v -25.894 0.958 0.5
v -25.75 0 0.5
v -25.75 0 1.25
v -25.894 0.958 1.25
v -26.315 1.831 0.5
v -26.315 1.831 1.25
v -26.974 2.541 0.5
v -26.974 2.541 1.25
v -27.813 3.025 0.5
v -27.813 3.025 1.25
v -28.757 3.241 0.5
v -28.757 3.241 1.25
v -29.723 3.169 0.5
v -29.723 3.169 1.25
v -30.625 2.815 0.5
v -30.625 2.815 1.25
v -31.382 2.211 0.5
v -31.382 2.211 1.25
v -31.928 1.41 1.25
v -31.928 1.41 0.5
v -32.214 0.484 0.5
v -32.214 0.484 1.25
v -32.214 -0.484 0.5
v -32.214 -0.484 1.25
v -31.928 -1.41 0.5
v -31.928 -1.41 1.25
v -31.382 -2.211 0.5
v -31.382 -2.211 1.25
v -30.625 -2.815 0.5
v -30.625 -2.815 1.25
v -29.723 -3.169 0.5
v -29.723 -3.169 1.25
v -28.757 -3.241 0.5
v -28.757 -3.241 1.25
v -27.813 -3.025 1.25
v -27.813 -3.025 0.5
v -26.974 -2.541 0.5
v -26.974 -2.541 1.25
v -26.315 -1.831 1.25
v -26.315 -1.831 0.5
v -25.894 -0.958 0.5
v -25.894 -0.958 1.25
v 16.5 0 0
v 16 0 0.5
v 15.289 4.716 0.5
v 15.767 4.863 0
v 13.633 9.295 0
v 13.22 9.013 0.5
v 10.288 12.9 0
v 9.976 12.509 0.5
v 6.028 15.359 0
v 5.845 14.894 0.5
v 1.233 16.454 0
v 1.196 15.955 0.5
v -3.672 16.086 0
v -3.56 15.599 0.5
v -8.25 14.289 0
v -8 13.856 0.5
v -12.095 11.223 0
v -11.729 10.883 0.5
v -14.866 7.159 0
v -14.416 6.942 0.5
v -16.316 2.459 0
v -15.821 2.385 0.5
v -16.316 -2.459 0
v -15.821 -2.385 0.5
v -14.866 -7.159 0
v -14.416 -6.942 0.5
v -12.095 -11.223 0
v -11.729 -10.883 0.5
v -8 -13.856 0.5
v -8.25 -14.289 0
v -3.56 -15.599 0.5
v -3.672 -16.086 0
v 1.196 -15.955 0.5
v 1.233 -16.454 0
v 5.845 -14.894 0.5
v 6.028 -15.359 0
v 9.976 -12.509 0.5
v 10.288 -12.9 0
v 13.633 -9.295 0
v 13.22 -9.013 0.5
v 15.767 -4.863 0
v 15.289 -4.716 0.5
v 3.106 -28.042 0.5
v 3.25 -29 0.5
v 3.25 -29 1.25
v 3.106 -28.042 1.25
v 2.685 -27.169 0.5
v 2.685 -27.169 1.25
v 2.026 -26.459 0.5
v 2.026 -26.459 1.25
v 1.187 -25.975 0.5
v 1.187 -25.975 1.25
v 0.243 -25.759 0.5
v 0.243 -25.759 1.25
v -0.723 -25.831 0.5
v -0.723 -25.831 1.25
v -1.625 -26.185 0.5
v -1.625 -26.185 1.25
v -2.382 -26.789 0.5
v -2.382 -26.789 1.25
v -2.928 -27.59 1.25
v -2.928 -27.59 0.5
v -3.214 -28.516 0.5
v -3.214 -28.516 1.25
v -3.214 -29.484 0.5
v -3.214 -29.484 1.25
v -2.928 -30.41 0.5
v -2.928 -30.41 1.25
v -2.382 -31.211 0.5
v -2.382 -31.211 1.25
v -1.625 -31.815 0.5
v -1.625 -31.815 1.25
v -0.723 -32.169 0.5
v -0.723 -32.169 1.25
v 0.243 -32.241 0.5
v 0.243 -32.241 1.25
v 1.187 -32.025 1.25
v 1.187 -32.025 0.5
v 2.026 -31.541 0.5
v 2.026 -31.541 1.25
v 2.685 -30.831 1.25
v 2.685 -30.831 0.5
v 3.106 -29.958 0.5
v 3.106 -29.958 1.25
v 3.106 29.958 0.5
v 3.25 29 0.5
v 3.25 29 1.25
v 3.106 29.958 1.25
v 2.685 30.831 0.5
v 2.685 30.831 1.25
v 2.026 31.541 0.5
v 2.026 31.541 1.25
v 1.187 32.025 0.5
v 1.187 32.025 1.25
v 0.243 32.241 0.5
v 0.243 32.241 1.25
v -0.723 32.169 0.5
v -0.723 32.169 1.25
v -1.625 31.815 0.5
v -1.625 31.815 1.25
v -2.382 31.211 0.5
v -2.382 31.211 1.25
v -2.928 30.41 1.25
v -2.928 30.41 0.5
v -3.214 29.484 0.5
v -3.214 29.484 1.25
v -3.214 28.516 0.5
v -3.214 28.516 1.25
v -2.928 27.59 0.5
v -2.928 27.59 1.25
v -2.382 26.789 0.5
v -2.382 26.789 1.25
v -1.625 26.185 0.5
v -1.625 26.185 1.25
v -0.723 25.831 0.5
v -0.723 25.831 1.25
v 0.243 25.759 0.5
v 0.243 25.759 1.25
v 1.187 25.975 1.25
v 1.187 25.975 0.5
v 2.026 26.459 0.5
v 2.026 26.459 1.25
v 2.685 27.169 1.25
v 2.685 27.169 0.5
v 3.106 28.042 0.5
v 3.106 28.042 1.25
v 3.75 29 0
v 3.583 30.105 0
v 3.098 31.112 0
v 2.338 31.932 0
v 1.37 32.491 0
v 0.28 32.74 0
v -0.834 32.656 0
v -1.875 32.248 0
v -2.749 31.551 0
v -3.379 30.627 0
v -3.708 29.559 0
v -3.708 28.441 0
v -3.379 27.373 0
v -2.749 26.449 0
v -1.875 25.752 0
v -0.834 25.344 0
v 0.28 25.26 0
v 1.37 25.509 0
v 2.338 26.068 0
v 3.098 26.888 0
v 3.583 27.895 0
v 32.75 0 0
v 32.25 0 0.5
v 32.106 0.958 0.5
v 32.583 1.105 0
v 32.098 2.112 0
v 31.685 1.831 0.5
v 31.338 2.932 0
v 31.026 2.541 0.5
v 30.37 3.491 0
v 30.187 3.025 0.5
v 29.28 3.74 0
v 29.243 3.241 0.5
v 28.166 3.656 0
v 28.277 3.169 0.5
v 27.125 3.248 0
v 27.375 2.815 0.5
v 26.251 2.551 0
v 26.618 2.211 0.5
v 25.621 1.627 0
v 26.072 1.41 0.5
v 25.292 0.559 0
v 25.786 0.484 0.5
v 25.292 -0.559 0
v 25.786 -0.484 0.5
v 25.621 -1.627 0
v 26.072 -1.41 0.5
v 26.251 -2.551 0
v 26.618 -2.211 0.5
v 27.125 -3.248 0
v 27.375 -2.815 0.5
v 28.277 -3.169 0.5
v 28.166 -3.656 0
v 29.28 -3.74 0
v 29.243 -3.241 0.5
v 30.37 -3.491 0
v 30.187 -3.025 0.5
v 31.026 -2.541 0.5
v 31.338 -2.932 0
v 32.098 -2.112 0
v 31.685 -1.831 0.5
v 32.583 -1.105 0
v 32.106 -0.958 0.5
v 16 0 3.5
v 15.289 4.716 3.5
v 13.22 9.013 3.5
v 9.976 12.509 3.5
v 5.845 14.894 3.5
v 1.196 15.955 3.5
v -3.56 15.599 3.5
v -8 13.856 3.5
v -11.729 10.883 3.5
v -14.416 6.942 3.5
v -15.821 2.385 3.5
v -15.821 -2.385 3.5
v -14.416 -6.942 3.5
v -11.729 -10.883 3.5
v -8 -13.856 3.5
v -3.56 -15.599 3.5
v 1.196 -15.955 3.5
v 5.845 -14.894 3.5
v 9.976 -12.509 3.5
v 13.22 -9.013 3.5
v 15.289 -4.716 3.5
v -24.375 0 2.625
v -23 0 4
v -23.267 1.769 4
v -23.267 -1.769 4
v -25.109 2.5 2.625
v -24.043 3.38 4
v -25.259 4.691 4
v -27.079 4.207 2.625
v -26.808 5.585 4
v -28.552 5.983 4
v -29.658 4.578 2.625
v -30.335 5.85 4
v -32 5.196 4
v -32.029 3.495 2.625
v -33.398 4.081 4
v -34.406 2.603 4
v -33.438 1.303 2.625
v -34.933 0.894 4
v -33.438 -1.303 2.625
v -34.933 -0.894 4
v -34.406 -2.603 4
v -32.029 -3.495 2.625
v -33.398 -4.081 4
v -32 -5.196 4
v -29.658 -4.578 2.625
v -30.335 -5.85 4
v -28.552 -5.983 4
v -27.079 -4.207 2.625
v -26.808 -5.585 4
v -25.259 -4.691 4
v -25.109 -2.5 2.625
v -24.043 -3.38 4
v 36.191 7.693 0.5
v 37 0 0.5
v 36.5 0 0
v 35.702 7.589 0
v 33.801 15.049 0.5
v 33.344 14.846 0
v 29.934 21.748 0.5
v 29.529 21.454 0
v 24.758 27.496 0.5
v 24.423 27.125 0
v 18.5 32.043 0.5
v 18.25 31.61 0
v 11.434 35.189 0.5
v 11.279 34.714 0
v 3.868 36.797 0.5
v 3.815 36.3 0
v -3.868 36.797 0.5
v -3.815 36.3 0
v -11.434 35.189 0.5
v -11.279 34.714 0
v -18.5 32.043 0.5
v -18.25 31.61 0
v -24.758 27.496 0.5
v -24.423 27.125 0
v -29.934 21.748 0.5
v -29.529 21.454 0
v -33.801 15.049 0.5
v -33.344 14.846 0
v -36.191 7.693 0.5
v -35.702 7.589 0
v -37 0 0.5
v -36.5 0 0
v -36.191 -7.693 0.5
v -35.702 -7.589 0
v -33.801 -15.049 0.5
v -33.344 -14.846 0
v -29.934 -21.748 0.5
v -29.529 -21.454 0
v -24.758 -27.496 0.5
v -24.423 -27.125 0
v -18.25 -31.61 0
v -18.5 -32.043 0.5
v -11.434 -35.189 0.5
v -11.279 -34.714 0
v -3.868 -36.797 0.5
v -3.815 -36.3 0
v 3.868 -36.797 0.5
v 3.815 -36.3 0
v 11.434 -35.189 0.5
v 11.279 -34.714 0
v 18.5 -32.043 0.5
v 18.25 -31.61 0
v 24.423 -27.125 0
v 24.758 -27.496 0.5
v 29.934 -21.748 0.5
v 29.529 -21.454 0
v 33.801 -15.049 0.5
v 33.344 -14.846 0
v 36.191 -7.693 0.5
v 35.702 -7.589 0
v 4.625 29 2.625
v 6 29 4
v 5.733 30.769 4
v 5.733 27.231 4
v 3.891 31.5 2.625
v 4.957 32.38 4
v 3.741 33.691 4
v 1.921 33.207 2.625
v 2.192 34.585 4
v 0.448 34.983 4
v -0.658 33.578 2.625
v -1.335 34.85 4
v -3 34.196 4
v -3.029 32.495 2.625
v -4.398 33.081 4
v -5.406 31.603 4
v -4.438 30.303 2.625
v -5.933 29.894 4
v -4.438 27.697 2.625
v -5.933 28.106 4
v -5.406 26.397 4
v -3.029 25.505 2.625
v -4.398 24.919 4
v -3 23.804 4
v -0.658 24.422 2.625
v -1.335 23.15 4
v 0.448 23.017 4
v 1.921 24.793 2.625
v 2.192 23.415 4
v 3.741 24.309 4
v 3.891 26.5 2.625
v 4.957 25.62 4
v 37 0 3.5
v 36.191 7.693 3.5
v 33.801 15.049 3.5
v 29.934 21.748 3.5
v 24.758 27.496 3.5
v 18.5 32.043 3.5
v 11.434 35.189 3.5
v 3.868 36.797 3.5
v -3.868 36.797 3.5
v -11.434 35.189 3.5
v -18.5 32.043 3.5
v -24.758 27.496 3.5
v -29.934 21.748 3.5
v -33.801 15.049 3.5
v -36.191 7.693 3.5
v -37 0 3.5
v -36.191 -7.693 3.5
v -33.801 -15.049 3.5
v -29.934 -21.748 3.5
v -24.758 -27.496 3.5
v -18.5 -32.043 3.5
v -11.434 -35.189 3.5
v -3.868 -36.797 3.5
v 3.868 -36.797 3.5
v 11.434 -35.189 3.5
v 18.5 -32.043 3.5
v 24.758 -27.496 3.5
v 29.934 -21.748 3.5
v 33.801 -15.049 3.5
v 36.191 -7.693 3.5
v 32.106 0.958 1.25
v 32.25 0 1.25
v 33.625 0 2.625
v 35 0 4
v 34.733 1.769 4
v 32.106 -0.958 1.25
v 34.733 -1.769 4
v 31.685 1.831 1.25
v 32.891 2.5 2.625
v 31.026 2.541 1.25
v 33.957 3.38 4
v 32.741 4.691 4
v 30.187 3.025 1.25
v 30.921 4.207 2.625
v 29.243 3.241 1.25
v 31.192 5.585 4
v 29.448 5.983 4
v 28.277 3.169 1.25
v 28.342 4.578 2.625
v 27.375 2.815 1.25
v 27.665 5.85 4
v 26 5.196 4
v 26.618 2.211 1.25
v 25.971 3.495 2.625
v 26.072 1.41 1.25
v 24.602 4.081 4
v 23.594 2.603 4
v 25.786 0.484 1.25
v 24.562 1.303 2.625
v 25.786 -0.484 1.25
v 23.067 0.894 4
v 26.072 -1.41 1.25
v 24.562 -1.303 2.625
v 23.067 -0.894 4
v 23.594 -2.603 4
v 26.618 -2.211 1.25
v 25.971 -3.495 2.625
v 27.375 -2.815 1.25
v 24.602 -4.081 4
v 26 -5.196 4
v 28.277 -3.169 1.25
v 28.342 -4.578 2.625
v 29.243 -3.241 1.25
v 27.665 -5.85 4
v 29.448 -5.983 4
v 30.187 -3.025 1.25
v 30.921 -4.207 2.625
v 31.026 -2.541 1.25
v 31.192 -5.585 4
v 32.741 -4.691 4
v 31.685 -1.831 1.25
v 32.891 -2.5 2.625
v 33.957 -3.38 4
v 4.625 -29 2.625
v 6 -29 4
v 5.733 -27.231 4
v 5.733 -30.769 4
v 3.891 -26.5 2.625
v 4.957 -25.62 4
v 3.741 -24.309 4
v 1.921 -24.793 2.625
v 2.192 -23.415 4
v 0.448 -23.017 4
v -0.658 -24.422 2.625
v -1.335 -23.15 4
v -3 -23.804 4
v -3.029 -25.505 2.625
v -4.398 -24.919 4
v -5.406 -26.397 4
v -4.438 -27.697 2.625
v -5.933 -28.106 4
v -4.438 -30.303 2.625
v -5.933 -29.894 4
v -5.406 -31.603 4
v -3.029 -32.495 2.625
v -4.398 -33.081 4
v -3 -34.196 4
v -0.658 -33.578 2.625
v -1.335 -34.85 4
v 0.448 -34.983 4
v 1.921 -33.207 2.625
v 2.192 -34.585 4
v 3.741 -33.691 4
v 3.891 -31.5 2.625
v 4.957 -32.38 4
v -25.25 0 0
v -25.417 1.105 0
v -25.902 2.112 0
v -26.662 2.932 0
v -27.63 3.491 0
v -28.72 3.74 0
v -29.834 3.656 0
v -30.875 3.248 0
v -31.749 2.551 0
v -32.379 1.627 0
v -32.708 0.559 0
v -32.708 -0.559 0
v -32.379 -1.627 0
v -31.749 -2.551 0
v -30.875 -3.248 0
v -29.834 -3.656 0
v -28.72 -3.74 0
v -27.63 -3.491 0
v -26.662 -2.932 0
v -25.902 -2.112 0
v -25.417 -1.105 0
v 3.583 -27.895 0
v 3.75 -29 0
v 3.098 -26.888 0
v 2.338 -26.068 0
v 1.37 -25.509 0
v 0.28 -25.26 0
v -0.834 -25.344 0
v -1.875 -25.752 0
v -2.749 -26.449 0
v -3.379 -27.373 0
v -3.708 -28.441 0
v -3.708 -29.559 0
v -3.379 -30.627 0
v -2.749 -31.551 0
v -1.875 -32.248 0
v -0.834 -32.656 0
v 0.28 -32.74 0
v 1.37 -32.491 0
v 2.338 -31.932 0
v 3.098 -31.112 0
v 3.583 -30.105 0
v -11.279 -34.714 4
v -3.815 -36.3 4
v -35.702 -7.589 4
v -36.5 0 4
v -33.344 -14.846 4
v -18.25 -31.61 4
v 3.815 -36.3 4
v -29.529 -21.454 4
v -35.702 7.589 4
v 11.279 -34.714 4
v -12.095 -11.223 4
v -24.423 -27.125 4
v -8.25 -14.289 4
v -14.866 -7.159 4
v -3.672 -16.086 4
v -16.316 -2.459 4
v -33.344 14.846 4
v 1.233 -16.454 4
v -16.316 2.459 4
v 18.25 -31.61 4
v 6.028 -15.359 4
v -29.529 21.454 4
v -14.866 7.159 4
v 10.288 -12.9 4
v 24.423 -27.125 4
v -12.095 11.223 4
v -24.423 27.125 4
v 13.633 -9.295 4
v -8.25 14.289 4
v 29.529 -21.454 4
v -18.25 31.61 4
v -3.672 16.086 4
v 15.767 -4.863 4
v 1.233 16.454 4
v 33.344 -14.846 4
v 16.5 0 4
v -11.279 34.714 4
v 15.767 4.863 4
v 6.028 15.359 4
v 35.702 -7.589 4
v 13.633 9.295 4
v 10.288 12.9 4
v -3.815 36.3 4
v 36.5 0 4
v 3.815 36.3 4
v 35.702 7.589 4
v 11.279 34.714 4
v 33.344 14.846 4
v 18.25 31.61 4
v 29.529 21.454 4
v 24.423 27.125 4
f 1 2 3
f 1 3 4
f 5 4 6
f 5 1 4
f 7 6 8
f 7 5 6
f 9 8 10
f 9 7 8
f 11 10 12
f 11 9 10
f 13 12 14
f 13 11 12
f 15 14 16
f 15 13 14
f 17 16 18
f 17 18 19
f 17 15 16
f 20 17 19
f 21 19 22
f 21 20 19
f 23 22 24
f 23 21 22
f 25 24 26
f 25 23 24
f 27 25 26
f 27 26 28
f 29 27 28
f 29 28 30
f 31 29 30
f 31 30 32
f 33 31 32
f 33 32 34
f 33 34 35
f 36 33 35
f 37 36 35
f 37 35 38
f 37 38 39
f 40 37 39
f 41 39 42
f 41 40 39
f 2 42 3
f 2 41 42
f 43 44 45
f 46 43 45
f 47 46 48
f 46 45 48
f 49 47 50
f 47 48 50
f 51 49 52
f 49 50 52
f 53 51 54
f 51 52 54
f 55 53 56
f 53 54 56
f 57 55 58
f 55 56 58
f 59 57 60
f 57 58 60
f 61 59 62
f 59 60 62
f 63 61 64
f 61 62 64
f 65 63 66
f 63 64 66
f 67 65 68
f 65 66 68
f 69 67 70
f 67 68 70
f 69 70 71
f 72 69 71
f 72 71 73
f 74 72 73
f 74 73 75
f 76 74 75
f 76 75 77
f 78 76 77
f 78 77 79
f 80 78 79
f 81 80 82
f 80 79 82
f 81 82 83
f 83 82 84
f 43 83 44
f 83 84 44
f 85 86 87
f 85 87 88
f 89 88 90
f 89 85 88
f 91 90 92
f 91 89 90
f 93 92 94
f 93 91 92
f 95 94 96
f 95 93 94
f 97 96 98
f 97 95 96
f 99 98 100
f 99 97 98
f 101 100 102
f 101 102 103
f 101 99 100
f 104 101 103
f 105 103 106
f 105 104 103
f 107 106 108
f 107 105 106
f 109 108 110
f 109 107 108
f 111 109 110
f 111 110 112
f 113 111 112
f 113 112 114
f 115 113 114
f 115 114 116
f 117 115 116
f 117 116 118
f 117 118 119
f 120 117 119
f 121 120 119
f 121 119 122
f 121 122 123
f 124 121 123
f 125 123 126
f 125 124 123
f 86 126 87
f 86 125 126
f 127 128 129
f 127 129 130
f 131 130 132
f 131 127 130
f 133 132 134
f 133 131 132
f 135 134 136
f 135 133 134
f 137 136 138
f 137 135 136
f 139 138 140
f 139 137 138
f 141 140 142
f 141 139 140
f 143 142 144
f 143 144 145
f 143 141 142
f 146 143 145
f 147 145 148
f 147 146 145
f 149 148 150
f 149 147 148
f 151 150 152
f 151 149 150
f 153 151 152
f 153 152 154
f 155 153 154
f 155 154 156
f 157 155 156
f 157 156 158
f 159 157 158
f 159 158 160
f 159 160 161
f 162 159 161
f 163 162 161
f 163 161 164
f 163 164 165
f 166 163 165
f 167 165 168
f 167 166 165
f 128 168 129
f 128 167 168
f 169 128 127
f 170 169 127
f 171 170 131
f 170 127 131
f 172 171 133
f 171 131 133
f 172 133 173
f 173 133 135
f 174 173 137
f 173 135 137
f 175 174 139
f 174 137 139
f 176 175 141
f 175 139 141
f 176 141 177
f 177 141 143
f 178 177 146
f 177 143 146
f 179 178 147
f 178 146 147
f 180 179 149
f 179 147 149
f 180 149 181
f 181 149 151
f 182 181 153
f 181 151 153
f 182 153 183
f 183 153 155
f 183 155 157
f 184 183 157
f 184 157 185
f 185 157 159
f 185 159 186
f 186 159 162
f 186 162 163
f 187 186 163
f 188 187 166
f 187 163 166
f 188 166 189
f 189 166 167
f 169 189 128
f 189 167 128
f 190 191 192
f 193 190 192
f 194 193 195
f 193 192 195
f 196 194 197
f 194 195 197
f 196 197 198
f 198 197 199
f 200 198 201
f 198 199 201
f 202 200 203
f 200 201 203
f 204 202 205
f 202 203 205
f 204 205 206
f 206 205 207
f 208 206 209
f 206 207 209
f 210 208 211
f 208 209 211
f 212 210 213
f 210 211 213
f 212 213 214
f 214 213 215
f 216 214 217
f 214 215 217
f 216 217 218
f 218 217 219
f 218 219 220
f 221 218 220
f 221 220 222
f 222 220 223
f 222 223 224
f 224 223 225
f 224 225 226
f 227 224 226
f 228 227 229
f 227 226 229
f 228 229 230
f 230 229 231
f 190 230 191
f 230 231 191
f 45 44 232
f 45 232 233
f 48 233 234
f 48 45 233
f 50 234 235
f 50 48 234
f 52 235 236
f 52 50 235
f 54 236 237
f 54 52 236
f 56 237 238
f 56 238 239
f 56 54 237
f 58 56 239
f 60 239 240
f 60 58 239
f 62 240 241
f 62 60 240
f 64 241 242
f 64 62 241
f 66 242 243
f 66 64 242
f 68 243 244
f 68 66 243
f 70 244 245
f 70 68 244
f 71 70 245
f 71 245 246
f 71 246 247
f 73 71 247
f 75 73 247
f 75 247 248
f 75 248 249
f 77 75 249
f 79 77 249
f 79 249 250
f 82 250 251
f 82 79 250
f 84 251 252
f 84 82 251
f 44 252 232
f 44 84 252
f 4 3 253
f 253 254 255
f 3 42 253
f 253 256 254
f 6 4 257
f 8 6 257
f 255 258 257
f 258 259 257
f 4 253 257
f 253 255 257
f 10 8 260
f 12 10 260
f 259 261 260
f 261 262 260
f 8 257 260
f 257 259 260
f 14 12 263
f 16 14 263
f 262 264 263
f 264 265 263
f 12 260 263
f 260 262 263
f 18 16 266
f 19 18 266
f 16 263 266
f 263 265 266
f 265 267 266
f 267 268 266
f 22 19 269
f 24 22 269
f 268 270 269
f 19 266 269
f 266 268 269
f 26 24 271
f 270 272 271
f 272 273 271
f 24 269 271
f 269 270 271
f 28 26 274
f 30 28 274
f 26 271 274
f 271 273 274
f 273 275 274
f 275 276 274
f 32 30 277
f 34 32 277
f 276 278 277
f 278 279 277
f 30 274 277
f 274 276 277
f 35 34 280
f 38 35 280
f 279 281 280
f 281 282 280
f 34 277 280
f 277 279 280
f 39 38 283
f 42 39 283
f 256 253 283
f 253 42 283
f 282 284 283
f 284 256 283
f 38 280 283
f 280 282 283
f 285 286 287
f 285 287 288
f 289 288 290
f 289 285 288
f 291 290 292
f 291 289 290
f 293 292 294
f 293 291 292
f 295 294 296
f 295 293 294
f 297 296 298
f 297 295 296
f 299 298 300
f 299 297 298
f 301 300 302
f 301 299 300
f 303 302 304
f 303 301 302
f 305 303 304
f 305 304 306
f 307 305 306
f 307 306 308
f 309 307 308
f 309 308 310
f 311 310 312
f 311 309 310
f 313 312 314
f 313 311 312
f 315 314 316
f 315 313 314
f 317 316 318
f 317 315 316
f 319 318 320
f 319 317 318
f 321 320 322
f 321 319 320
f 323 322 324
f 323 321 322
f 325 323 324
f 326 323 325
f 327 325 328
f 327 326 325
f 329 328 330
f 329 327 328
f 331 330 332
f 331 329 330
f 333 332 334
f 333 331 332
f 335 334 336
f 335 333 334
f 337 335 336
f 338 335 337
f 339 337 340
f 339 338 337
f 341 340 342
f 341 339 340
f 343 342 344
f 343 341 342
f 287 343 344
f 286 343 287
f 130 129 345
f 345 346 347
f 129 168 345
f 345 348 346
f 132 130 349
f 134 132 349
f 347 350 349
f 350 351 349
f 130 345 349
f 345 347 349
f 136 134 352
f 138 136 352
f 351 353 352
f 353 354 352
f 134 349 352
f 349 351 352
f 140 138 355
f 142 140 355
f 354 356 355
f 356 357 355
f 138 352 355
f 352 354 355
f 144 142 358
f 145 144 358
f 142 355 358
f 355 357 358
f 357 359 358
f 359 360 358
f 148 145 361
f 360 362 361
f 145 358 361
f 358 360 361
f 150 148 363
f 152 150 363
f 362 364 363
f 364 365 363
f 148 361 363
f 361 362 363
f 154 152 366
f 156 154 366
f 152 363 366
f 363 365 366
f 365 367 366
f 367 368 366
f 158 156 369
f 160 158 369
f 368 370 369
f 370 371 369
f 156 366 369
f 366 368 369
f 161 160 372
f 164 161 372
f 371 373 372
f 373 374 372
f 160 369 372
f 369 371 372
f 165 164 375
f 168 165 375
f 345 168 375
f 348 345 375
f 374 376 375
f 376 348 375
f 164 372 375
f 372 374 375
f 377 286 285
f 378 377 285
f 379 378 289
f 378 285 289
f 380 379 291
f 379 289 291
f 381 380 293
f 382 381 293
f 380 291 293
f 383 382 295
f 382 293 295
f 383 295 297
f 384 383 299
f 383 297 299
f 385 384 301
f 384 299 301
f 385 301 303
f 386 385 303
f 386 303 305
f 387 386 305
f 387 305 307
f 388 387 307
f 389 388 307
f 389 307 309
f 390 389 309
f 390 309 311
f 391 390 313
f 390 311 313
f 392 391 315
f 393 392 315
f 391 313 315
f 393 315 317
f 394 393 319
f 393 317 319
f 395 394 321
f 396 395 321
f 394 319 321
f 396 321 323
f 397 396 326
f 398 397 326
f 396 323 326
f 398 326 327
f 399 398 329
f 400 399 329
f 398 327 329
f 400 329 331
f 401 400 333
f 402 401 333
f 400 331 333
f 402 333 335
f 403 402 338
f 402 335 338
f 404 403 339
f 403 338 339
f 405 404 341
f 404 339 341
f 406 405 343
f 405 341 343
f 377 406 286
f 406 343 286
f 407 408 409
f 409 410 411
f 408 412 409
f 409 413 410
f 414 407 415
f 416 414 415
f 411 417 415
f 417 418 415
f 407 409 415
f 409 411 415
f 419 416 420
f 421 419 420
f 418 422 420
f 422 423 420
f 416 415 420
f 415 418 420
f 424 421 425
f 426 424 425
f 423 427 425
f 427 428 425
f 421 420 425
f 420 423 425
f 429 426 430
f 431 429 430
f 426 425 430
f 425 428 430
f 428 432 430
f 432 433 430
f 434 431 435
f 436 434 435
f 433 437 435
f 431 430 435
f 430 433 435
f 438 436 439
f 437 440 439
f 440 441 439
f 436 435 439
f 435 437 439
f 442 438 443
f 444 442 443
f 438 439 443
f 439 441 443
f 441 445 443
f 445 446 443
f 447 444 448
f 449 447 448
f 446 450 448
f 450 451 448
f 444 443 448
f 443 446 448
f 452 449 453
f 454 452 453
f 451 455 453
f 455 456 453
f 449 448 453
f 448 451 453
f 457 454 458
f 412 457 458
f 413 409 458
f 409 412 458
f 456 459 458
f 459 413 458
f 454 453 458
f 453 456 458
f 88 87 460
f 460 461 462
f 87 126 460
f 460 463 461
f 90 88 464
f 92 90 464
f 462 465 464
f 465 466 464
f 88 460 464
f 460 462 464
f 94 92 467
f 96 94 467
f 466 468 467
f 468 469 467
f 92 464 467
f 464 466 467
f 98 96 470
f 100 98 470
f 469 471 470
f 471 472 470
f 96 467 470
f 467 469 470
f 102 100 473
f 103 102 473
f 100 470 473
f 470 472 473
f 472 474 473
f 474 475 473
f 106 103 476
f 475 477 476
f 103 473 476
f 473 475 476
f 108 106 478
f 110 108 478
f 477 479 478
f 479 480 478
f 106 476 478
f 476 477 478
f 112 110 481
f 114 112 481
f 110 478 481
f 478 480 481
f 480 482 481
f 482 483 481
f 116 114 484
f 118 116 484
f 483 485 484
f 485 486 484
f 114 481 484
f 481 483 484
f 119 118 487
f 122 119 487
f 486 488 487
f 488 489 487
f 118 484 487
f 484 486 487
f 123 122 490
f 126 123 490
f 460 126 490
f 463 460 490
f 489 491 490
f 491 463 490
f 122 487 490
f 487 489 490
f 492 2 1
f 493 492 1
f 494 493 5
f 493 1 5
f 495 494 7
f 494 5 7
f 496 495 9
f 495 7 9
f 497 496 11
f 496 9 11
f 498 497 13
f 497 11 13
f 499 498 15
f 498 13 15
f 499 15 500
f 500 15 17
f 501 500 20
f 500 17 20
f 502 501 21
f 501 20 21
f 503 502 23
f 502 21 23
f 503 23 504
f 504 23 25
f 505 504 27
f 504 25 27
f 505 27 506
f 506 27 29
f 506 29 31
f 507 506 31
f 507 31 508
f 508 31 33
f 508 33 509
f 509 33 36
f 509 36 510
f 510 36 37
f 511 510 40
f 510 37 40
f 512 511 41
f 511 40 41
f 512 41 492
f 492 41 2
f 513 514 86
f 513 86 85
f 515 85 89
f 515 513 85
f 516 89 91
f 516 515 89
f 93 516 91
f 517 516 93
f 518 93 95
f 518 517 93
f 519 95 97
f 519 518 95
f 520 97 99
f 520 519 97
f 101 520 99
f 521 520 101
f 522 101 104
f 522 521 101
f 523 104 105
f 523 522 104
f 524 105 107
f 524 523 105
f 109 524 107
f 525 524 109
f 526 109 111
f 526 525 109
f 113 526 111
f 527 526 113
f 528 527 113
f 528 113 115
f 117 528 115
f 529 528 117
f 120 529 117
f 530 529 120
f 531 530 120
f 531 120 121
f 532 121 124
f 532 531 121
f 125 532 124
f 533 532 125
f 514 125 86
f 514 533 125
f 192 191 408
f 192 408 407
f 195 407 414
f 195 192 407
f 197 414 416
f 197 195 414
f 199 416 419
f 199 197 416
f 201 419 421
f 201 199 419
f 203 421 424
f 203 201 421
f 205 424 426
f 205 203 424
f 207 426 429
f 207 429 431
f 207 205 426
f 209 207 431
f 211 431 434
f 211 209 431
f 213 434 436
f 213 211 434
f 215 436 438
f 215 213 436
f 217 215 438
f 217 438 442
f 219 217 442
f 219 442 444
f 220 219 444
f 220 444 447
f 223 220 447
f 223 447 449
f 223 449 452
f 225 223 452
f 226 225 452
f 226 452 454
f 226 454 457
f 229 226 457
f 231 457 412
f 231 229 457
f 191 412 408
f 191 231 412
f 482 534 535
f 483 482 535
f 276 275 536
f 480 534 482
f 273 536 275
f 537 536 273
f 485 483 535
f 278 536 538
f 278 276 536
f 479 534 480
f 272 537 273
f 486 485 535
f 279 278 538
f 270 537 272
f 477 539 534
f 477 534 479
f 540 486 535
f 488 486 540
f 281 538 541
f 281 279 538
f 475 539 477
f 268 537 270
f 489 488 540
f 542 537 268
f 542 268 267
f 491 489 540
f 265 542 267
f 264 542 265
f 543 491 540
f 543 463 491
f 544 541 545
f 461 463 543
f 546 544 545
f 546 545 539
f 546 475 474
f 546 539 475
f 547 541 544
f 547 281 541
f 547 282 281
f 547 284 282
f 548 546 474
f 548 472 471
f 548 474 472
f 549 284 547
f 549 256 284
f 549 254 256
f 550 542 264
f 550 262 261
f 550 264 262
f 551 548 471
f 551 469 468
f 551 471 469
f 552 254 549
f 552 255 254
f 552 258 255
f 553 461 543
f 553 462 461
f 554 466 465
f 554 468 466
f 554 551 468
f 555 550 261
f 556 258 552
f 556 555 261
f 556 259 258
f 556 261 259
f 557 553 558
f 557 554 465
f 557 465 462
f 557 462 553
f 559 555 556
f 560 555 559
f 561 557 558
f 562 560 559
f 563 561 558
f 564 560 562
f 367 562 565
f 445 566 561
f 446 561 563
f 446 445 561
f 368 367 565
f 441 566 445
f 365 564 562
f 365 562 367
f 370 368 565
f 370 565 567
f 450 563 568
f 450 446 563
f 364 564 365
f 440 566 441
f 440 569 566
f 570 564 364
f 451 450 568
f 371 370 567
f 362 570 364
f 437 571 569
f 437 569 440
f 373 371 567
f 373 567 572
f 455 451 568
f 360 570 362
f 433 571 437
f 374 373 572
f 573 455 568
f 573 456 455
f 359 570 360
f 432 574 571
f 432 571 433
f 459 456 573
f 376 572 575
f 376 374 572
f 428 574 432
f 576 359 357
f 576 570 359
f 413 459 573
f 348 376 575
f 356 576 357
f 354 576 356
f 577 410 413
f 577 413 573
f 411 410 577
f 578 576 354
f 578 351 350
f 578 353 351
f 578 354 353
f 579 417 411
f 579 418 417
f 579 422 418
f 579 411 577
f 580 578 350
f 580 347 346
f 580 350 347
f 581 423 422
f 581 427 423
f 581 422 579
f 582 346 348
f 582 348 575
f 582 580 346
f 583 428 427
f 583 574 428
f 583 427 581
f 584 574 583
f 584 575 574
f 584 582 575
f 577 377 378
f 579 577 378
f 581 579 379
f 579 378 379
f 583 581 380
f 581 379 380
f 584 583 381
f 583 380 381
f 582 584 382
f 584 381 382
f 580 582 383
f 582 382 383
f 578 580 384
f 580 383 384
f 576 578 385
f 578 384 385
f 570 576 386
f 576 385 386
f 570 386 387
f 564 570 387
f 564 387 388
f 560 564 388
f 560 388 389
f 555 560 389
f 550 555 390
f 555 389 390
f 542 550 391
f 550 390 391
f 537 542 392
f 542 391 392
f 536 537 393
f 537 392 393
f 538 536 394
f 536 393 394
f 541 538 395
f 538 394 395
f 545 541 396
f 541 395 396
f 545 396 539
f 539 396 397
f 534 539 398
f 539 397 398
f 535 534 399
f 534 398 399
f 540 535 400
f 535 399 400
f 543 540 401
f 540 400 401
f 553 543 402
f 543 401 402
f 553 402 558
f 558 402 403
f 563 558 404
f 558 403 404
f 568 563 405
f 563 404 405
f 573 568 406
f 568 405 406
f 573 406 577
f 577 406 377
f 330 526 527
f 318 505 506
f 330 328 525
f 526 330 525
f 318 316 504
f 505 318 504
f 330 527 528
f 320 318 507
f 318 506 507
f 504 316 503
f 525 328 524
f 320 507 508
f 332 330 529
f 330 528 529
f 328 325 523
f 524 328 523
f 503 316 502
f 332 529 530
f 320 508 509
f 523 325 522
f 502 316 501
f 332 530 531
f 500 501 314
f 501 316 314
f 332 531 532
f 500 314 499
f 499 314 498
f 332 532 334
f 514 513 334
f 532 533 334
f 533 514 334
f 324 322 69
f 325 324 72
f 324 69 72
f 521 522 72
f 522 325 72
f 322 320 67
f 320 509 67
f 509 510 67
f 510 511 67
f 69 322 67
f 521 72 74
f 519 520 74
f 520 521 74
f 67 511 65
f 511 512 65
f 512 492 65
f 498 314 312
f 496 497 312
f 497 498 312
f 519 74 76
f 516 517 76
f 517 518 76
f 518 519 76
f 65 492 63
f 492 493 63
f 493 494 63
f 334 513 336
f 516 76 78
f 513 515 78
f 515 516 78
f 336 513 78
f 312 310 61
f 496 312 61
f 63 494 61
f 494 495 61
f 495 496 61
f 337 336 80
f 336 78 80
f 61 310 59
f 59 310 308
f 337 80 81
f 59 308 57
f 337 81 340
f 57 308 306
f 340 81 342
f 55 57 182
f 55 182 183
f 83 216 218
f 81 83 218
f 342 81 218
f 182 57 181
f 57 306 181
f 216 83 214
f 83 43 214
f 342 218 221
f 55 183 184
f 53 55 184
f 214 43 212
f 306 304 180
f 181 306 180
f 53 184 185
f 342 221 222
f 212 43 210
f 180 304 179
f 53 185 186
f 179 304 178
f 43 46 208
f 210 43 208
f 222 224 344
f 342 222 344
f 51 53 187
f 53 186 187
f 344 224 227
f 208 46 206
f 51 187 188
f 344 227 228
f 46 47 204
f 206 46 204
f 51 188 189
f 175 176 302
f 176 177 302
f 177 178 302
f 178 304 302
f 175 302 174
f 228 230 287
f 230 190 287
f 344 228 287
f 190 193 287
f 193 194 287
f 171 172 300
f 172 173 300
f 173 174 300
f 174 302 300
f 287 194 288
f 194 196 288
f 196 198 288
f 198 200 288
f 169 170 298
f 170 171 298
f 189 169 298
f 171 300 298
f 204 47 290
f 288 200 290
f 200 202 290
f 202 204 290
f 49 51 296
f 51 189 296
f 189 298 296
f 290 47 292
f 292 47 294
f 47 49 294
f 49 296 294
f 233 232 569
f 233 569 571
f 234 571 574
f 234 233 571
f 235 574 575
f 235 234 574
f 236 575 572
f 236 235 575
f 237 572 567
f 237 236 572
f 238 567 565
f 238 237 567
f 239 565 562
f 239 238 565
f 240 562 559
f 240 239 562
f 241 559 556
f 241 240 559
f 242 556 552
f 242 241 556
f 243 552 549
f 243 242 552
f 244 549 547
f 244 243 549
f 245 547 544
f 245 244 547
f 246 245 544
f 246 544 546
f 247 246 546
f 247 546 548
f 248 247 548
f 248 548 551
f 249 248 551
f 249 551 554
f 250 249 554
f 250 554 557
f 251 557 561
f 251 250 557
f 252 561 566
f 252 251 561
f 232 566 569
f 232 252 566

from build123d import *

# Parameters (mm, degrees)
F0_R     = 37
F0_R_2   = 3.25
F0_R_3   = 16
F1_DEPTH = 4
F2_SIZE  = 2.75
F3_SIZE  = 0.5


with BuildPart() as f1:
    # F0 (on Top) → F1 (new body)
    with BuildSketch(Plane.XY):
        Circle(F0_R)
        with Locations((0, -29)):
            Circle(F0_R_2, mode=Mode.SUBTRACT)
        with Locations((-29, 0)):
            Circle(F0_R_2, mode=Mode.SUBTRACT)
        Circle(F0_R_3, mode=Mode.SUBTRACT)
        with Locations((29, 0)):
            Circle(F0_R_2, mode=Mode.SUBTRACT)
        with Locations((0, 29)):
            Circle(F0_R_2, mode=Mode.SUBTRACT)
    extrude(amount=F1_DEPTH)

    # F2
    f2_edges = [f1.edges().sort_by_distance(p)[0] for p in [
        (-3.25, -29, 4),
        (-32.25, 0, 4),
        (-3.25, 29, 4),
        (25.75, 0, 4),
    ]]
    chamfer(f2_edges, length=F2_SIZE)

    # F3
    f3_edges = [f1.edges().sort_by_distance(p)[0] for p in [
        (16, 0, 2),
        (-16, 0, 0),
        (-16, 0, 4),
        (37, 0, 2),
        (-37, 0, 0),
        (-37, 0, 4),
        (-3.25, -29, 0),
        (-32.25, 0, 0),
        (25.75, 0, 0),
        (-3.25, 29, 0),
    ]]
    chamfer(f3_edges, length=F3_SIZE)


solid = f1.part
